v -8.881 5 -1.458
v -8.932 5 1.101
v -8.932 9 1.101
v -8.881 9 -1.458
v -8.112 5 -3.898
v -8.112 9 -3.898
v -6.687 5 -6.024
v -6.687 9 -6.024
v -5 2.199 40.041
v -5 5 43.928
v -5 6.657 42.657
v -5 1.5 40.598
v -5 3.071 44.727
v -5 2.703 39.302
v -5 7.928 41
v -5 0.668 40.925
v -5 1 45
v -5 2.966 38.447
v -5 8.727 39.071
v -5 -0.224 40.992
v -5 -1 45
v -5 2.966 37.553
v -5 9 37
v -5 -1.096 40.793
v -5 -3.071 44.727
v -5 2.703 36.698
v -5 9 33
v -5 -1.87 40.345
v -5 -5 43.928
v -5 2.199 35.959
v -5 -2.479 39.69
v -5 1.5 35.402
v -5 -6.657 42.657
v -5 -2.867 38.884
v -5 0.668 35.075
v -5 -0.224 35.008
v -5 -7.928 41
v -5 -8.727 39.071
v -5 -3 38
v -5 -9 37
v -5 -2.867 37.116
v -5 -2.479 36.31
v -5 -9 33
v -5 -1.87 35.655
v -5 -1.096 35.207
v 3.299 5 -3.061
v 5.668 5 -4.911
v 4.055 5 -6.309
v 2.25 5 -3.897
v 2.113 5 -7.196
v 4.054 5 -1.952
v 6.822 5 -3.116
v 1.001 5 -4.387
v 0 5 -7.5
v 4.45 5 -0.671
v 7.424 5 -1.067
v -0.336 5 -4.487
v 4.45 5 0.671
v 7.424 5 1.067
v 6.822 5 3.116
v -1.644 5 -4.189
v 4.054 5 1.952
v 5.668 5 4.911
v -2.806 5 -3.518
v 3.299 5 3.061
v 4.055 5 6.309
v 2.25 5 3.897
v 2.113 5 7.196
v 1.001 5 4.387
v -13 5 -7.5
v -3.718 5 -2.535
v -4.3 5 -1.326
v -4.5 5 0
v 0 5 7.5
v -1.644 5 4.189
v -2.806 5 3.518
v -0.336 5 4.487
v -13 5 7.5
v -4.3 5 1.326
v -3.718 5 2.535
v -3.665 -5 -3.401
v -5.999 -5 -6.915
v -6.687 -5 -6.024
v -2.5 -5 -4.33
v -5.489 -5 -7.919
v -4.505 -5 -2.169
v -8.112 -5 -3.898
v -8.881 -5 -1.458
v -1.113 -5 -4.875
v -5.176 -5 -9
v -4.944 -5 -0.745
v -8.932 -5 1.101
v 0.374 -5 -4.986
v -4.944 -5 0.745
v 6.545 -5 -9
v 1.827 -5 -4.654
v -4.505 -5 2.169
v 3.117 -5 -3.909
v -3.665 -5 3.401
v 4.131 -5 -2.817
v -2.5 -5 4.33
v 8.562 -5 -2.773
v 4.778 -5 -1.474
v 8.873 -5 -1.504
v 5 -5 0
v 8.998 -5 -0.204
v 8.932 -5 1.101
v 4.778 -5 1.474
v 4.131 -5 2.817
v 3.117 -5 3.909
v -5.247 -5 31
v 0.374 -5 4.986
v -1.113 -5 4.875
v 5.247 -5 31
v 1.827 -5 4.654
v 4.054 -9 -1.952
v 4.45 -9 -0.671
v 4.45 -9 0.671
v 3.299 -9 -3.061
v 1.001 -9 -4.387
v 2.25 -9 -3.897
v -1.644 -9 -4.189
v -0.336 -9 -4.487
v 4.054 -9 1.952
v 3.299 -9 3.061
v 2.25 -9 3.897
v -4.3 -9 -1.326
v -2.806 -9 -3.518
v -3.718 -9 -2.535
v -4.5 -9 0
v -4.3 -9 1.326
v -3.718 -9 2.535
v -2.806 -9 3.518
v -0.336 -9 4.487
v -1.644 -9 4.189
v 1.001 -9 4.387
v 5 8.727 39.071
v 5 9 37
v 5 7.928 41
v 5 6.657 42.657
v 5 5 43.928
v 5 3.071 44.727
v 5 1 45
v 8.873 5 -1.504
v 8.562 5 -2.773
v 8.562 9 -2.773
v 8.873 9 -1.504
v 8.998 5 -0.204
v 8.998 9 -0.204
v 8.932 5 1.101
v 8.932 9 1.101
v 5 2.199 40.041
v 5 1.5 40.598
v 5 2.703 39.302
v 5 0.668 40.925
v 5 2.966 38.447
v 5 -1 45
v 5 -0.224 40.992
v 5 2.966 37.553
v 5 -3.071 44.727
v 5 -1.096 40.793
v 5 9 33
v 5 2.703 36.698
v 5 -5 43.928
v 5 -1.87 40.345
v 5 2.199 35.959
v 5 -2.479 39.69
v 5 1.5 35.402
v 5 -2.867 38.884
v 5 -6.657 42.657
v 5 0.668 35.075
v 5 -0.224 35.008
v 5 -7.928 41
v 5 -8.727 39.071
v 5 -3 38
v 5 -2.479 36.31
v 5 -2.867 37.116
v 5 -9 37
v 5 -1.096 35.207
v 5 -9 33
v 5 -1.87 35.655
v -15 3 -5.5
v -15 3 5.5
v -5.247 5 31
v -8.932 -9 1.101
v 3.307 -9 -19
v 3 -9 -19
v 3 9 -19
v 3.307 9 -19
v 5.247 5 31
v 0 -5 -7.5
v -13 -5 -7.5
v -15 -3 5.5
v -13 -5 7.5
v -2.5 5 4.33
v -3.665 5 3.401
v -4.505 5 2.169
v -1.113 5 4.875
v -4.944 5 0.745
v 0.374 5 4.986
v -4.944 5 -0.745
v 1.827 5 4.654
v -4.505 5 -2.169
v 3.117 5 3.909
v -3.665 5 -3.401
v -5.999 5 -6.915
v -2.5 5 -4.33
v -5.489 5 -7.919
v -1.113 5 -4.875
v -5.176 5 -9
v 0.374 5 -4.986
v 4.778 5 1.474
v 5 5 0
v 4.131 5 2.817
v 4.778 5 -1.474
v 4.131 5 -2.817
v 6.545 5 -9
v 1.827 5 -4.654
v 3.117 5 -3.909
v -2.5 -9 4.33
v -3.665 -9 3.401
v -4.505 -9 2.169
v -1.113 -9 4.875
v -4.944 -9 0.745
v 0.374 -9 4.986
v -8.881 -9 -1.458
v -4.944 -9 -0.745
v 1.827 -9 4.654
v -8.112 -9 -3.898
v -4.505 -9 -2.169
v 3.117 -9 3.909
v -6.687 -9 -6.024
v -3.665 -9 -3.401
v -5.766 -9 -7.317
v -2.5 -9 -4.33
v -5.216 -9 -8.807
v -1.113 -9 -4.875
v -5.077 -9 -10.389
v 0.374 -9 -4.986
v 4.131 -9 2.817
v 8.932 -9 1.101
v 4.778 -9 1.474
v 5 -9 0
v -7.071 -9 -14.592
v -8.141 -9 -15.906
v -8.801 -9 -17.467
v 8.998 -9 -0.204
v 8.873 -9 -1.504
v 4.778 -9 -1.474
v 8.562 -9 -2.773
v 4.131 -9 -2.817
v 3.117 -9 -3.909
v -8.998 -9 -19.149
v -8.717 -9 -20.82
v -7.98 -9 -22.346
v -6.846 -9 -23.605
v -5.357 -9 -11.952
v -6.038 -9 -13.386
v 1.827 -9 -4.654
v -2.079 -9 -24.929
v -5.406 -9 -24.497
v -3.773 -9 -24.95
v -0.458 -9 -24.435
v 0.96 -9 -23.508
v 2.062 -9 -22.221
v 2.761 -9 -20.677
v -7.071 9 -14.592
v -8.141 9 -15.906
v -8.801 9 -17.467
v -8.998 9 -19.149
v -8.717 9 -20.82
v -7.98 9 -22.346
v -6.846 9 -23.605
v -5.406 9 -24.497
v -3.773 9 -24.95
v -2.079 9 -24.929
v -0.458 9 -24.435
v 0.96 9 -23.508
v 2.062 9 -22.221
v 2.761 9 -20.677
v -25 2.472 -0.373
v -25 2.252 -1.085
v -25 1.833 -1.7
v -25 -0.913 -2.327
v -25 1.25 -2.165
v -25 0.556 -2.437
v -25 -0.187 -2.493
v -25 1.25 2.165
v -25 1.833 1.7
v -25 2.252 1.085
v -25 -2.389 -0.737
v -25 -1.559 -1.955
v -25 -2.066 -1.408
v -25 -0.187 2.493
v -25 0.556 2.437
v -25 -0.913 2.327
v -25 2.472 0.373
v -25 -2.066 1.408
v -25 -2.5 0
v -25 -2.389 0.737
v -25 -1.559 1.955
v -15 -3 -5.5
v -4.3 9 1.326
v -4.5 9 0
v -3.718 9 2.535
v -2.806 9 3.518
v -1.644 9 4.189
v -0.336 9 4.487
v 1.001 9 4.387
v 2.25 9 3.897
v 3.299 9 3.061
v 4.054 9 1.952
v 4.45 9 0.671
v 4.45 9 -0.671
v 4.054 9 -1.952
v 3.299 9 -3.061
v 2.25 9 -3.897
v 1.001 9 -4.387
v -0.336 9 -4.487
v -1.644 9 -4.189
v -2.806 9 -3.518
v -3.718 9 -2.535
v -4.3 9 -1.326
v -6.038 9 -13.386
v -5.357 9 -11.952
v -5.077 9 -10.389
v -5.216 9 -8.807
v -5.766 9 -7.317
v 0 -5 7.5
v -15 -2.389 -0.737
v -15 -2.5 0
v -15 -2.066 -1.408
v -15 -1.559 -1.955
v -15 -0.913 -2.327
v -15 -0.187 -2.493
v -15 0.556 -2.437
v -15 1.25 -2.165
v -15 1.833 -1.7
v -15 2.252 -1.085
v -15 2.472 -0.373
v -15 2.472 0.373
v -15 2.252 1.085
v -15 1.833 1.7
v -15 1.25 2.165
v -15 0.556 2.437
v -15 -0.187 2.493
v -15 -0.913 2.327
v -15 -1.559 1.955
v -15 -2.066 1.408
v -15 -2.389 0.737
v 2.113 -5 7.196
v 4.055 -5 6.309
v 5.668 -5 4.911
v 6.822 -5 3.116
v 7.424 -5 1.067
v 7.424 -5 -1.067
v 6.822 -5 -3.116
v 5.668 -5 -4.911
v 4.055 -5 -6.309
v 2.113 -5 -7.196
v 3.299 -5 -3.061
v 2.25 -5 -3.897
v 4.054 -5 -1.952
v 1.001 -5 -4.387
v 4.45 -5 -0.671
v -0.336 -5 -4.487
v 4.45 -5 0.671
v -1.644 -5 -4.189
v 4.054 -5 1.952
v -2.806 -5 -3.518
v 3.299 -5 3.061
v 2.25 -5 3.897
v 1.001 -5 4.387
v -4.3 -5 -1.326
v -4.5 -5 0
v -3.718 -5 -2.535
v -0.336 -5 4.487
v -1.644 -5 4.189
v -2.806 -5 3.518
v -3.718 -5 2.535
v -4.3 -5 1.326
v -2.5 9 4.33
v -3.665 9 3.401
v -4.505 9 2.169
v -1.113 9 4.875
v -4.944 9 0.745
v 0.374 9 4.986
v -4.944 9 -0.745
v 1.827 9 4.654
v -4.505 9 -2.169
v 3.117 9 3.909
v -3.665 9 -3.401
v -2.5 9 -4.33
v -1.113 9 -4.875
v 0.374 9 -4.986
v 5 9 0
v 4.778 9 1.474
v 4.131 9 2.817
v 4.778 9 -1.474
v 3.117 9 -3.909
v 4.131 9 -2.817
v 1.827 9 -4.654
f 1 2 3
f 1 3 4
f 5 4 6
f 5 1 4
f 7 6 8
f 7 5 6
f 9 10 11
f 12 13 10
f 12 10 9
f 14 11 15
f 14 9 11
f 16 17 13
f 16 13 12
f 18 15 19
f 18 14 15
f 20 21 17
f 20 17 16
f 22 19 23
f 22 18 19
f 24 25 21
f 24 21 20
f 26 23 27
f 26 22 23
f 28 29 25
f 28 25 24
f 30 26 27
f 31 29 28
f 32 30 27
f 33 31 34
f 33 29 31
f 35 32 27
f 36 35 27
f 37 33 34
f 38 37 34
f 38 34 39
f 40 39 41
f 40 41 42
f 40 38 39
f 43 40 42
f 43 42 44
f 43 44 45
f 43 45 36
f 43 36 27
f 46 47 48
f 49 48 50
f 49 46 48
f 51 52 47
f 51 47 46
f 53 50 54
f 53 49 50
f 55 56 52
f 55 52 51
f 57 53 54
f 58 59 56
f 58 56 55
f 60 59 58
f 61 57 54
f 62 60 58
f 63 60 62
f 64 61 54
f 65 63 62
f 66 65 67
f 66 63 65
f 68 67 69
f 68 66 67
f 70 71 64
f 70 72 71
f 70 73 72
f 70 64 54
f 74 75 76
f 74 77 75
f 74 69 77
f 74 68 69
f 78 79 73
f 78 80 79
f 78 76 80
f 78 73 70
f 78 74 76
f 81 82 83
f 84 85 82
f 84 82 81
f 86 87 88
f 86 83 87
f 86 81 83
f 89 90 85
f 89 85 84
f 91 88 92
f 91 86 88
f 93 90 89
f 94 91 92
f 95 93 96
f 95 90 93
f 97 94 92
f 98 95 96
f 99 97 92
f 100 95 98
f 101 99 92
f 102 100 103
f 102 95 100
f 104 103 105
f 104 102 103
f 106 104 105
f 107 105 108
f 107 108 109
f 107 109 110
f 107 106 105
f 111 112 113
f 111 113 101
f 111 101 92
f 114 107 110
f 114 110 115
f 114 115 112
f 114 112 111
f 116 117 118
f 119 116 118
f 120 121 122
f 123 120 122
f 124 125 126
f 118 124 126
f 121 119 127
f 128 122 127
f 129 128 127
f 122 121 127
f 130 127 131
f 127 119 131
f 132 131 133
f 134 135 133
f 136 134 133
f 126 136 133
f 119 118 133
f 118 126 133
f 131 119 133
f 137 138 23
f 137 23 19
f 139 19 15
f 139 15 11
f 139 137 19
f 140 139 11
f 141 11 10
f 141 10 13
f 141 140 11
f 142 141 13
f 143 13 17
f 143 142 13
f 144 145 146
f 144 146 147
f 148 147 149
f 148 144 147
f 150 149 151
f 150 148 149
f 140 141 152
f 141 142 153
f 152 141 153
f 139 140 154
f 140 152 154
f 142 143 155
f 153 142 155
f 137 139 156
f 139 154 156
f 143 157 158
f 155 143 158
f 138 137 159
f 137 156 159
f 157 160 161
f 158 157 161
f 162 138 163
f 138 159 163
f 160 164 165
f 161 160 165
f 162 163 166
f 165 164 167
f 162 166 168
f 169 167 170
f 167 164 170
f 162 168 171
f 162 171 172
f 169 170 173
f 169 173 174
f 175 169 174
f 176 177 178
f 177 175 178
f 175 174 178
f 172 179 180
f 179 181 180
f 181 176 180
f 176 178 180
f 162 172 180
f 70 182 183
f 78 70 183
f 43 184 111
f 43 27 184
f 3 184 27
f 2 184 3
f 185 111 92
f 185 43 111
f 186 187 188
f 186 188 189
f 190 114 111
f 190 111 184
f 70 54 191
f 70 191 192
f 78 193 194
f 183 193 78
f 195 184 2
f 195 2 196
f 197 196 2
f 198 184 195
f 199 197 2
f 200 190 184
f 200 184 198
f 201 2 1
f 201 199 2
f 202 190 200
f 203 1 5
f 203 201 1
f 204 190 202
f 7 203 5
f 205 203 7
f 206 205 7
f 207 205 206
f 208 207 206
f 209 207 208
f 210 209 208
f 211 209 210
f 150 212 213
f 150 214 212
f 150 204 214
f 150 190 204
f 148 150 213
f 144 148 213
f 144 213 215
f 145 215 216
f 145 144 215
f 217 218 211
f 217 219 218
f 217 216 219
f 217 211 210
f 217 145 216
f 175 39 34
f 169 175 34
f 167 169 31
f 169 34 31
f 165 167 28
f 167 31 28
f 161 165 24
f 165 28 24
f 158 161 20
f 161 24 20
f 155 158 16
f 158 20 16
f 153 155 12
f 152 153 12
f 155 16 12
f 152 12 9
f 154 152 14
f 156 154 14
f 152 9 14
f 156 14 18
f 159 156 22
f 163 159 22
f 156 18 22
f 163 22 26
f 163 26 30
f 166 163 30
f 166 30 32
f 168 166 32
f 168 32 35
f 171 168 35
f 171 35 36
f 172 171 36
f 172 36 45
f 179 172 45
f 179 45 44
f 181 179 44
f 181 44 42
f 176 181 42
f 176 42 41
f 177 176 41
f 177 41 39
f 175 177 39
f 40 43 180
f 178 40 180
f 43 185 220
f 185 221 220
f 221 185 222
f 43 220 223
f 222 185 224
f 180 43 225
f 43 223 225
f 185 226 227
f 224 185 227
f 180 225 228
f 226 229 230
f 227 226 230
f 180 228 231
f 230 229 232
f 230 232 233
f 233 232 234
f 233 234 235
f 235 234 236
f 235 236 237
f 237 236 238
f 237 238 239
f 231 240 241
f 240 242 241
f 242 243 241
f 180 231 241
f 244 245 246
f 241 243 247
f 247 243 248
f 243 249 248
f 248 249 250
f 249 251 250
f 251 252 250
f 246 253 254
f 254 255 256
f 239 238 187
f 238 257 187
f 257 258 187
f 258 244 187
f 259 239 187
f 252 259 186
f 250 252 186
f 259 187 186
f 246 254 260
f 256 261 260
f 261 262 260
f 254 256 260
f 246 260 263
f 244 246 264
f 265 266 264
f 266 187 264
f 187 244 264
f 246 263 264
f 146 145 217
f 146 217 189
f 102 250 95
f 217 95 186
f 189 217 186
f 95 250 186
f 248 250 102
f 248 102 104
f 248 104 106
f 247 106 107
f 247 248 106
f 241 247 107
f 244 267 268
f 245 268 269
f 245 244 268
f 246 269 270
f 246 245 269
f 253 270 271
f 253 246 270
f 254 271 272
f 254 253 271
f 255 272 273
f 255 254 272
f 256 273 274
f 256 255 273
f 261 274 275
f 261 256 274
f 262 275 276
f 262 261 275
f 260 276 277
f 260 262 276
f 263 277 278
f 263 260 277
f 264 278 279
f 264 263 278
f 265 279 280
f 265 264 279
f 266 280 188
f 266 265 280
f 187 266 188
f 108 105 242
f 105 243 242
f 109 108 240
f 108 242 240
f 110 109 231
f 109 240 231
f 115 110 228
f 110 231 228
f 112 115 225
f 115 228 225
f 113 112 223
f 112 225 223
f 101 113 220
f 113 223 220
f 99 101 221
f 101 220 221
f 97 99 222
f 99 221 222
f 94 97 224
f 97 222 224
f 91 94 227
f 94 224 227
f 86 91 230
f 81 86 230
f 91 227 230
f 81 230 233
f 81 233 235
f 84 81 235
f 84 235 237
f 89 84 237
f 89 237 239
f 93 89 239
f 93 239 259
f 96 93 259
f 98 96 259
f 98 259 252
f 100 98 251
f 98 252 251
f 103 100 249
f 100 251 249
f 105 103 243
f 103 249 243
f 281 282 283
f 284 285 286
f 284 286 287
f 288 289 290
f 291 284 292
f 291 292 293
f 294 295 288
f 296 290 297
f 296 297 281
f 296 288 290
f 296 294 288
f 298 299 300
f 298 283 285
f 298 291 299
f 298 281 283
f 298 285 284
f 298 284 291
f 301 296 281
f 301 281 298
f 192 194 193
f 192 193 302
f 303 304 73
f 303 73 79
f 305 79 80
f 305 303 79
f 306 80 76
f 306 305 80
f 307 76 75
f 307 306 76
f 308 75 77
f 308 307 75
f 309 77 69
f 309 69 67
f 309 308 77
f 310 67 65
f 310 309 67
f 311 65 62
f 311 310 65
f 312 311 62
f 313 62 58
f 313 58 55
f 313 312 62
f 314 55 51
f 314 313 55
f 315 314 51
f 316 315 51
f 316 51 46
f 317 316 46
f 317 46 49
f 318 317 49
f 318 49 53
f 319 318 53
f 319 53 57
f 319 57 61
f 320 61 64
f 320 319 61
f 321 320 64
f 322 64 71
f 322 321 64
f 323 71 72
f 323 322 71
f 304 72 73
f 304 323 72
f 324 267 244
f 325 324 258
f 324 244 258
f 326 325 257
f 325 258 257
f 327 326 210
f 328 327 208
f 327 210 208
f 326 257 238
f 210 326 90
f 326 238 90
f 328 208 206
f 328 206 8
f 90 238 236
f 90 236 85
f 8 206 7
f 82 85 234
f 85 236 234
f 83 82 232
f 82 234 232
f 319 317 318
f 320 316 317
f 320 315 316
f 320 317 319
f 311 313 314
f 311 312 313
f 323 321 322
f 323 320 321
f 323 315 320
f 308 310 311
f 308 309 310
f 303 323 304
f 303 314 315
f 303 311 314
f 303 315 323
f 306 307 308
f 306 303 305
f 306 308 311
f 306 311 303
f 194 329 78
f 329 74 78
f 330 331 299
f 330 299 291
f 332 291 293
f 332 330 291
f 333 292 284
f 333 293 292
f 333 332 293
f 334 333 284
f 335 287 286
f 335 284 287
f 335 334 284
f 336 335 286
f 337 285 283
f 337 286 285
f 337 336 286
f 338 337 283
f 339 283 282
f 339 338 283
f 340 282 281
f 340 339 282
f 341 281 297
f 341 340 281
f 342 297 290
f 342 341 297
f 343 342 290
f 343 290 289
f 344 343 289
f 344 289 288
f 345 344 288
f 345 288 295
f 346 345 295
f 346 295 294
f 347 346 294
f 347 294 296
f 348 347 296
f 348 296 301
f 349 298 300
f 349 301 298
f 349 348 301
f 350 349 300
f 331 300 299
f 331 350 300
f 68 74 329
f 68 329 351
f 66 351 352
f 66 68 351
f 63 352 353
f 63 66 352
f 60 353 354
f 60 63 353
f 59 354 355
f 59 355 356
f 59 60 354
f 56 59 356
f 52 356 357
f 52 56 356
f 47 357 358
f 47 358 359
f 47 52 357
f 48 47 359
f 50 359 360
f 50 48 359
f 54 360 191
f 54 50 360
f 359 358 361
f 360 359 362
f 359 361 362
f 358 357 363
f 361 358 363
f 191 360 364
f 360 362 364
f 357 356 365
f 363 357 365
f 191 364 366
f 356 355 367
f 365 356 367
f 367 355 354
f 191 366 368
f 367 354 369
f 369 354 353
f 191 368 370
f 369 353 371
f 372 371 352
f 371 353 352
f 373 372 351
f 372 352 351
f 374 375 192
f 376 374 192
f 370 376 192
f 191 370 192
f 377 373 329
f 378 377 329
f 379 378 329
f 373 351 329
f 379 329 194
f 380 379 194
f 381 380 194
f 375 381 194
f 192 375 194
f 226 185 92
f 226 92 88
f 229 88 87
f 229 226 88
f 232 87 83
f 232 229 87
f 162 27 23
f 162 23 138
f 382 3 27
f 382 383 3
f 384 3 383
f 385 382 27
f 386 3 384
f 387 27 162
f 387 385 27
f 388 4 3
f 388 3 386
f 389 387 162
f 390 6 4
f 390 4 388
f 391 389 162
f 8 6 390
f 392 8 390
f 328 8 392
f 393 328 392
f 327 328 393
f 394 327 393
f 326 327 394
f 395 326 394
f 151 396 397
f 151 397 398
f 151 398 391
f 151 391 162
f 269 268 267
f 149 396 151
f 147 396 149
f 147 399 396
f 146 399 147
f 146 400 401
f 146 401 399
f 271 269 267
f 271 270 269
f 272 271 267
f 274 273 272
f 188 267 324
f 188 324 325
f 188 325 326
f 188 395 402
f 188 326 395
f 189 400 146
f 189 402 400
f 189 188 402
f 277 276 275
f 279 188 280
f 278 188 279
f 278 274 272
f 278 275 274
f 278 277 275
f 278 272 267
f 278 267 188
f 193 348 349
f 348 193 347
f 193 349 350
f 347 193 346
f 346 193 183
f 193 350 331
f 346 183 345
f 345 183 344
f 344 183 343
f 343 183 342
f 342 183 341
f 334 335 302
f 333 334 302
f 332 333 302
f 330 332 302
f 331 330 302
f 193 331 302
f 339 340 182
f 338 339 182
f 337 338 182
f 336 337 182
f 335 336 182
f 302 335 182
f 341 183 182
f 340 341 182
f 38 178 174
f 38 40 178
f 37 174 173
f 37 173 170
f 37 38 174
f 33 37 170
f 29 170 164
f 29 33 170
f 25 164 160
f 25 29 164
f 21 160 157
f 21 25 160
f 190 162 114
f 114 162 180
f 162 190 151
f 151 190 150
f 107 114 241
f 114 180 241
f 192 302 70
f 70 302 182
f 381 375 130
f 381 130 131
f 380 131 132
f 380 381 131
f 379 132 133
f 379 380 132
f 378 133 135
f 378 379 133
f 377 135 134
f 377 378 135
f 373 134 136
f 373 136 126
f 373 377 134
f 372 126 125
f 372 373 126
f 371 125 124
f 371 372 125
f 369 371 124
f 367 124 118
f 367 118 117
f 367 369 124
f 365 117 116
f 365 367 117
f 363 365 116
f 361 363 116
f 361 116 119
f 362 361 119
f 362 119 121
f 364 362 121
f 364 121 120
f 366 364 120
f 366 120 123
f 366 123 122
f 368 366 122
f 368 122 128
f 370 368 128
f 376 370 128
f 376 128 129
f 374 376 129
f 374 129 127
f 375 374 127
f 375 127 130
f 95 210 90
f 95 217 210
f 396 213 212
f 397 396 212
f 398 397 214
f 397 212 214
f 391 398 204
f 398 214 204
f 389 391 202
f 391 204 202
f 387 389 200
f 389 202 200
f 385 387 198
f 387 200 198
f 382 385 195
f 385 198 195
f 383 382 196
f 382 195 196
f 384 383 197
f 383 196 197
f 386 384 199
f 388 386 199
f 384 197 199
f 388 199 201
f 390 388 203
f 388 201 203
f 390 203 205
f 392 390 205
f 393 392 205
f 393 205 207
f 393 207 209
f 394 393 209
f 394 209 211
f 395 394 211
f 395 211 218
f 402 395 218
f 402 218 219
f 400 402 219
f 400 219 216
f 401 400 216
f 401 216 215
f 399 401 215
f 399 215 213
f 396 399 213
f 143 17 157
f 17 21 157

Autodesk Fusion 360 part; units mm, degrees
sketch "Sketch1" plane through (0, 0, 0) normal (0, 1, 0) x (1, 0, 0)
  circle A0 centre (0, 0) radius 5
  line L0 (0, 0) -> (-14, 0)
  line L1 (-14, 0) -> (-14, -38)
  line L2 (-14, -38) -> (-14, -45)
  line L3 (-14, 0) -> (-14, 19)
  line L4 (-14, 19) -> (8, 19)
  line L5 (0, 0) -> (0, 40)
  line L6 (0, 19) -> (-3, 19)
  line L7 (0, 0) -> (9, 0)
  line L8 (8.5622, 2.773) -> (2.7081, 20.8486)
  line L9 (0, 0) -> (0, -45)
  line L10 (-5, -45) -> (5, -45)
  line L11 (-5, -45) -> (-5, -33)
  line L12 (5, -45) -> (5, -33)
  line L13 (-5, -33) -> (-8.9324, -1.1012)
  line L14 (5, -33) -> (8.9324, -1.1012)
  arc A1 (-6.6867, 6.024) -> (-7.0709, 14.5923) centre (-11.0709, 10.1202) ccw
  arc A2 (3, 19) -> (-7, 14.5279) centre (-3, 19) ccw
  arc A3 (-6.5986, 6.1204) -> (-8.9324, -1.1012) centre (0, 0) ccw
  arc A4 (8.9324, -1.1012) -> (8.5622, 2.773) centre (0, 0) ccw
  dimension "d1" = 10
  dimension "d2" = 7
  dimension "d3" = 38
  dimension "d4" = 19
  dimension "d5" = 12
  dimension "d8" = 10
  dimension "d9" = 12
  dimension "d10" = 12
extrude "Extrude1" add sketch "Sketch1" along normal mid plane 18 contours A0 L7 L9 L10 L12 L14 A4 | A0 L4 L5 L7 L8 A4 | A0 L0 L4 L5 L6 A1 A2 A3 | A0 L0 L9 L10 L11 L13 A3 | L4 L5 A2 | L4 L5 L6 A2 makes body 1
sketch "Sketch2" plane through (-5, 0, 0) normal (-1, 0, 0) x (0, -1, 0)
  line L0 (9, 45) -> (-9, 45)
  line L1 (-9, 45) -> (-9, 33)
  line L2 (-9, 33) -> (9, 33)
  line L3 (9, 33) -> (9, 45)
  line L4 (0, 33) -> (0, 31)
  line L5 (0, 31) -> (-5, 31)
  line L6 (-5, 31) -> (-5, -9)
  line L7 (-5, -9) -> (5, -9)
  line L8 (5, -9) -> (5, 31)
  line L9 (5, 31) -> (0, 31)
  line L10 (0, 45) -> (0, 38)
  circle A0 centre (0, 38) radius 3
  dimension "d14" = 2
  dimension "d15" = 5
  dimension "d16" = 40
  dimension "d17" = 10
  dimension "d20" = 7
  dimension "d21" = 6
extrude "Extrude3" cut sketch "Sketch2" against normal blind 36.418 contours A0 bodies 1
extrude "Extrude2" cut sketch "Sketch2" along normal mid plane 75.984 contours L5 L6 L7 L8 L9 bodies 1
sketch "Sketch3" plane through (0, 9, 0) normal (0, 1, 0) x (-1, 0, 0)
  circle A0 centre (0, 0) radius 5
  line L0 (5, 45) -> (-5, 45)
  line L1 (-5, 45) -> (-5, 33)
  line L2 (-5, 33) -> (-8.9324, 1.1012)
  arc A1 (-8.9324, 1.1012) -> (-8.5622, -2.773) centre (0, 0) ccw
  line L3 (-8.5622, -2.773) -> (-3.3068, -19)
  line L4 (-3.3068, -19) -> (-3, -19)
  arc A2 (-3, -19) -> (7.0709, -14.5923) centre (3, -19) ccw
  arc A3 (6.6867, -6.024) -> (7.0709, -14.5923) centre (11.0709, -10.1202) ccw
  arc A4 (6.6867, -6.024) -> (8.9324, 1.1012) centre (0, 0) ccw
  line L5 (8.9324, 1.1012) -> (5, 33)
  line L6 (5, 33) -> (5, 45)
  circle A5 centre (0, 0) radius 4.5
  circle A6 centre (0, 0) radius 7.5
  line L7 (0, 0) -> (0, -7.5)
  line L8 (0, -7.5) -> (15, -7.5)
  line L9 (0, 0) -> (0, 7.5)
  line L10 (0, 7.5) -> (15, 7.5)
  line L11 (15, 7.5) -> (15, -7.5)
  dimension "d24" = 9
  dimension "d25" = 15
  dimension "d26" = 15
  dimension "d27" = 15
extrude "Extrude4" add sketch "Sketch3" against normal blind 4 separate body contours A5 L7 L9 | A5 L7 L9 makes body 2
extrude "Extrude5" add sketch "Sketch3" against normal blind 10 from surface at -4 separate body contours A0 A5 L7 L9 | A0 A6 L7 L9 | A0 A5 L7 L9 | A0 A6 L7 L9 | A5 L7 L9 | A5 L7 L9 | A3 A4 L5 A6 L8 L10 | A3 A4 L5 L8 L10 L11 makes body 3
extrude "Extrude6" add sketch "Sketch3" against normal blind 4 from surface at -14 contours A5 L7 L9 | A5 L7 L9 bodies 3
combine "Combine1" operation add target body 3 tool bodies 2
chamfer "Chamfer1" distance 2 angle 45 4 edges at (-15, 0, 7.5) (-15, 5, 0) (-15, -5, 0) (-15, 0, -7.5) on bodies 3
sketch "Sketch4" plane through (-15, 0, 0) normal (-1, 0, 0) x (0, -1, 0)
  line L0 (-3, -5.5) -> (3, -5.5)
  line L1 (3, -5.5) -> (3, 5.5)
  line L2 (3, 5.5) -> (-3, 5.5)
  line L3 (-3, 5.5) -> (-3, -5.5)
  circle A0 centre (0, 0) radius 2.5
  dimension "d37" = 5
extrude "Extrude7" add sketch "Sketch4" along normal blind 10 contours A0 bodies 3
fillet "Fillet1" radius 8 2 edges at (0, 9, 45) (0, -9, 45) on bodies 1
